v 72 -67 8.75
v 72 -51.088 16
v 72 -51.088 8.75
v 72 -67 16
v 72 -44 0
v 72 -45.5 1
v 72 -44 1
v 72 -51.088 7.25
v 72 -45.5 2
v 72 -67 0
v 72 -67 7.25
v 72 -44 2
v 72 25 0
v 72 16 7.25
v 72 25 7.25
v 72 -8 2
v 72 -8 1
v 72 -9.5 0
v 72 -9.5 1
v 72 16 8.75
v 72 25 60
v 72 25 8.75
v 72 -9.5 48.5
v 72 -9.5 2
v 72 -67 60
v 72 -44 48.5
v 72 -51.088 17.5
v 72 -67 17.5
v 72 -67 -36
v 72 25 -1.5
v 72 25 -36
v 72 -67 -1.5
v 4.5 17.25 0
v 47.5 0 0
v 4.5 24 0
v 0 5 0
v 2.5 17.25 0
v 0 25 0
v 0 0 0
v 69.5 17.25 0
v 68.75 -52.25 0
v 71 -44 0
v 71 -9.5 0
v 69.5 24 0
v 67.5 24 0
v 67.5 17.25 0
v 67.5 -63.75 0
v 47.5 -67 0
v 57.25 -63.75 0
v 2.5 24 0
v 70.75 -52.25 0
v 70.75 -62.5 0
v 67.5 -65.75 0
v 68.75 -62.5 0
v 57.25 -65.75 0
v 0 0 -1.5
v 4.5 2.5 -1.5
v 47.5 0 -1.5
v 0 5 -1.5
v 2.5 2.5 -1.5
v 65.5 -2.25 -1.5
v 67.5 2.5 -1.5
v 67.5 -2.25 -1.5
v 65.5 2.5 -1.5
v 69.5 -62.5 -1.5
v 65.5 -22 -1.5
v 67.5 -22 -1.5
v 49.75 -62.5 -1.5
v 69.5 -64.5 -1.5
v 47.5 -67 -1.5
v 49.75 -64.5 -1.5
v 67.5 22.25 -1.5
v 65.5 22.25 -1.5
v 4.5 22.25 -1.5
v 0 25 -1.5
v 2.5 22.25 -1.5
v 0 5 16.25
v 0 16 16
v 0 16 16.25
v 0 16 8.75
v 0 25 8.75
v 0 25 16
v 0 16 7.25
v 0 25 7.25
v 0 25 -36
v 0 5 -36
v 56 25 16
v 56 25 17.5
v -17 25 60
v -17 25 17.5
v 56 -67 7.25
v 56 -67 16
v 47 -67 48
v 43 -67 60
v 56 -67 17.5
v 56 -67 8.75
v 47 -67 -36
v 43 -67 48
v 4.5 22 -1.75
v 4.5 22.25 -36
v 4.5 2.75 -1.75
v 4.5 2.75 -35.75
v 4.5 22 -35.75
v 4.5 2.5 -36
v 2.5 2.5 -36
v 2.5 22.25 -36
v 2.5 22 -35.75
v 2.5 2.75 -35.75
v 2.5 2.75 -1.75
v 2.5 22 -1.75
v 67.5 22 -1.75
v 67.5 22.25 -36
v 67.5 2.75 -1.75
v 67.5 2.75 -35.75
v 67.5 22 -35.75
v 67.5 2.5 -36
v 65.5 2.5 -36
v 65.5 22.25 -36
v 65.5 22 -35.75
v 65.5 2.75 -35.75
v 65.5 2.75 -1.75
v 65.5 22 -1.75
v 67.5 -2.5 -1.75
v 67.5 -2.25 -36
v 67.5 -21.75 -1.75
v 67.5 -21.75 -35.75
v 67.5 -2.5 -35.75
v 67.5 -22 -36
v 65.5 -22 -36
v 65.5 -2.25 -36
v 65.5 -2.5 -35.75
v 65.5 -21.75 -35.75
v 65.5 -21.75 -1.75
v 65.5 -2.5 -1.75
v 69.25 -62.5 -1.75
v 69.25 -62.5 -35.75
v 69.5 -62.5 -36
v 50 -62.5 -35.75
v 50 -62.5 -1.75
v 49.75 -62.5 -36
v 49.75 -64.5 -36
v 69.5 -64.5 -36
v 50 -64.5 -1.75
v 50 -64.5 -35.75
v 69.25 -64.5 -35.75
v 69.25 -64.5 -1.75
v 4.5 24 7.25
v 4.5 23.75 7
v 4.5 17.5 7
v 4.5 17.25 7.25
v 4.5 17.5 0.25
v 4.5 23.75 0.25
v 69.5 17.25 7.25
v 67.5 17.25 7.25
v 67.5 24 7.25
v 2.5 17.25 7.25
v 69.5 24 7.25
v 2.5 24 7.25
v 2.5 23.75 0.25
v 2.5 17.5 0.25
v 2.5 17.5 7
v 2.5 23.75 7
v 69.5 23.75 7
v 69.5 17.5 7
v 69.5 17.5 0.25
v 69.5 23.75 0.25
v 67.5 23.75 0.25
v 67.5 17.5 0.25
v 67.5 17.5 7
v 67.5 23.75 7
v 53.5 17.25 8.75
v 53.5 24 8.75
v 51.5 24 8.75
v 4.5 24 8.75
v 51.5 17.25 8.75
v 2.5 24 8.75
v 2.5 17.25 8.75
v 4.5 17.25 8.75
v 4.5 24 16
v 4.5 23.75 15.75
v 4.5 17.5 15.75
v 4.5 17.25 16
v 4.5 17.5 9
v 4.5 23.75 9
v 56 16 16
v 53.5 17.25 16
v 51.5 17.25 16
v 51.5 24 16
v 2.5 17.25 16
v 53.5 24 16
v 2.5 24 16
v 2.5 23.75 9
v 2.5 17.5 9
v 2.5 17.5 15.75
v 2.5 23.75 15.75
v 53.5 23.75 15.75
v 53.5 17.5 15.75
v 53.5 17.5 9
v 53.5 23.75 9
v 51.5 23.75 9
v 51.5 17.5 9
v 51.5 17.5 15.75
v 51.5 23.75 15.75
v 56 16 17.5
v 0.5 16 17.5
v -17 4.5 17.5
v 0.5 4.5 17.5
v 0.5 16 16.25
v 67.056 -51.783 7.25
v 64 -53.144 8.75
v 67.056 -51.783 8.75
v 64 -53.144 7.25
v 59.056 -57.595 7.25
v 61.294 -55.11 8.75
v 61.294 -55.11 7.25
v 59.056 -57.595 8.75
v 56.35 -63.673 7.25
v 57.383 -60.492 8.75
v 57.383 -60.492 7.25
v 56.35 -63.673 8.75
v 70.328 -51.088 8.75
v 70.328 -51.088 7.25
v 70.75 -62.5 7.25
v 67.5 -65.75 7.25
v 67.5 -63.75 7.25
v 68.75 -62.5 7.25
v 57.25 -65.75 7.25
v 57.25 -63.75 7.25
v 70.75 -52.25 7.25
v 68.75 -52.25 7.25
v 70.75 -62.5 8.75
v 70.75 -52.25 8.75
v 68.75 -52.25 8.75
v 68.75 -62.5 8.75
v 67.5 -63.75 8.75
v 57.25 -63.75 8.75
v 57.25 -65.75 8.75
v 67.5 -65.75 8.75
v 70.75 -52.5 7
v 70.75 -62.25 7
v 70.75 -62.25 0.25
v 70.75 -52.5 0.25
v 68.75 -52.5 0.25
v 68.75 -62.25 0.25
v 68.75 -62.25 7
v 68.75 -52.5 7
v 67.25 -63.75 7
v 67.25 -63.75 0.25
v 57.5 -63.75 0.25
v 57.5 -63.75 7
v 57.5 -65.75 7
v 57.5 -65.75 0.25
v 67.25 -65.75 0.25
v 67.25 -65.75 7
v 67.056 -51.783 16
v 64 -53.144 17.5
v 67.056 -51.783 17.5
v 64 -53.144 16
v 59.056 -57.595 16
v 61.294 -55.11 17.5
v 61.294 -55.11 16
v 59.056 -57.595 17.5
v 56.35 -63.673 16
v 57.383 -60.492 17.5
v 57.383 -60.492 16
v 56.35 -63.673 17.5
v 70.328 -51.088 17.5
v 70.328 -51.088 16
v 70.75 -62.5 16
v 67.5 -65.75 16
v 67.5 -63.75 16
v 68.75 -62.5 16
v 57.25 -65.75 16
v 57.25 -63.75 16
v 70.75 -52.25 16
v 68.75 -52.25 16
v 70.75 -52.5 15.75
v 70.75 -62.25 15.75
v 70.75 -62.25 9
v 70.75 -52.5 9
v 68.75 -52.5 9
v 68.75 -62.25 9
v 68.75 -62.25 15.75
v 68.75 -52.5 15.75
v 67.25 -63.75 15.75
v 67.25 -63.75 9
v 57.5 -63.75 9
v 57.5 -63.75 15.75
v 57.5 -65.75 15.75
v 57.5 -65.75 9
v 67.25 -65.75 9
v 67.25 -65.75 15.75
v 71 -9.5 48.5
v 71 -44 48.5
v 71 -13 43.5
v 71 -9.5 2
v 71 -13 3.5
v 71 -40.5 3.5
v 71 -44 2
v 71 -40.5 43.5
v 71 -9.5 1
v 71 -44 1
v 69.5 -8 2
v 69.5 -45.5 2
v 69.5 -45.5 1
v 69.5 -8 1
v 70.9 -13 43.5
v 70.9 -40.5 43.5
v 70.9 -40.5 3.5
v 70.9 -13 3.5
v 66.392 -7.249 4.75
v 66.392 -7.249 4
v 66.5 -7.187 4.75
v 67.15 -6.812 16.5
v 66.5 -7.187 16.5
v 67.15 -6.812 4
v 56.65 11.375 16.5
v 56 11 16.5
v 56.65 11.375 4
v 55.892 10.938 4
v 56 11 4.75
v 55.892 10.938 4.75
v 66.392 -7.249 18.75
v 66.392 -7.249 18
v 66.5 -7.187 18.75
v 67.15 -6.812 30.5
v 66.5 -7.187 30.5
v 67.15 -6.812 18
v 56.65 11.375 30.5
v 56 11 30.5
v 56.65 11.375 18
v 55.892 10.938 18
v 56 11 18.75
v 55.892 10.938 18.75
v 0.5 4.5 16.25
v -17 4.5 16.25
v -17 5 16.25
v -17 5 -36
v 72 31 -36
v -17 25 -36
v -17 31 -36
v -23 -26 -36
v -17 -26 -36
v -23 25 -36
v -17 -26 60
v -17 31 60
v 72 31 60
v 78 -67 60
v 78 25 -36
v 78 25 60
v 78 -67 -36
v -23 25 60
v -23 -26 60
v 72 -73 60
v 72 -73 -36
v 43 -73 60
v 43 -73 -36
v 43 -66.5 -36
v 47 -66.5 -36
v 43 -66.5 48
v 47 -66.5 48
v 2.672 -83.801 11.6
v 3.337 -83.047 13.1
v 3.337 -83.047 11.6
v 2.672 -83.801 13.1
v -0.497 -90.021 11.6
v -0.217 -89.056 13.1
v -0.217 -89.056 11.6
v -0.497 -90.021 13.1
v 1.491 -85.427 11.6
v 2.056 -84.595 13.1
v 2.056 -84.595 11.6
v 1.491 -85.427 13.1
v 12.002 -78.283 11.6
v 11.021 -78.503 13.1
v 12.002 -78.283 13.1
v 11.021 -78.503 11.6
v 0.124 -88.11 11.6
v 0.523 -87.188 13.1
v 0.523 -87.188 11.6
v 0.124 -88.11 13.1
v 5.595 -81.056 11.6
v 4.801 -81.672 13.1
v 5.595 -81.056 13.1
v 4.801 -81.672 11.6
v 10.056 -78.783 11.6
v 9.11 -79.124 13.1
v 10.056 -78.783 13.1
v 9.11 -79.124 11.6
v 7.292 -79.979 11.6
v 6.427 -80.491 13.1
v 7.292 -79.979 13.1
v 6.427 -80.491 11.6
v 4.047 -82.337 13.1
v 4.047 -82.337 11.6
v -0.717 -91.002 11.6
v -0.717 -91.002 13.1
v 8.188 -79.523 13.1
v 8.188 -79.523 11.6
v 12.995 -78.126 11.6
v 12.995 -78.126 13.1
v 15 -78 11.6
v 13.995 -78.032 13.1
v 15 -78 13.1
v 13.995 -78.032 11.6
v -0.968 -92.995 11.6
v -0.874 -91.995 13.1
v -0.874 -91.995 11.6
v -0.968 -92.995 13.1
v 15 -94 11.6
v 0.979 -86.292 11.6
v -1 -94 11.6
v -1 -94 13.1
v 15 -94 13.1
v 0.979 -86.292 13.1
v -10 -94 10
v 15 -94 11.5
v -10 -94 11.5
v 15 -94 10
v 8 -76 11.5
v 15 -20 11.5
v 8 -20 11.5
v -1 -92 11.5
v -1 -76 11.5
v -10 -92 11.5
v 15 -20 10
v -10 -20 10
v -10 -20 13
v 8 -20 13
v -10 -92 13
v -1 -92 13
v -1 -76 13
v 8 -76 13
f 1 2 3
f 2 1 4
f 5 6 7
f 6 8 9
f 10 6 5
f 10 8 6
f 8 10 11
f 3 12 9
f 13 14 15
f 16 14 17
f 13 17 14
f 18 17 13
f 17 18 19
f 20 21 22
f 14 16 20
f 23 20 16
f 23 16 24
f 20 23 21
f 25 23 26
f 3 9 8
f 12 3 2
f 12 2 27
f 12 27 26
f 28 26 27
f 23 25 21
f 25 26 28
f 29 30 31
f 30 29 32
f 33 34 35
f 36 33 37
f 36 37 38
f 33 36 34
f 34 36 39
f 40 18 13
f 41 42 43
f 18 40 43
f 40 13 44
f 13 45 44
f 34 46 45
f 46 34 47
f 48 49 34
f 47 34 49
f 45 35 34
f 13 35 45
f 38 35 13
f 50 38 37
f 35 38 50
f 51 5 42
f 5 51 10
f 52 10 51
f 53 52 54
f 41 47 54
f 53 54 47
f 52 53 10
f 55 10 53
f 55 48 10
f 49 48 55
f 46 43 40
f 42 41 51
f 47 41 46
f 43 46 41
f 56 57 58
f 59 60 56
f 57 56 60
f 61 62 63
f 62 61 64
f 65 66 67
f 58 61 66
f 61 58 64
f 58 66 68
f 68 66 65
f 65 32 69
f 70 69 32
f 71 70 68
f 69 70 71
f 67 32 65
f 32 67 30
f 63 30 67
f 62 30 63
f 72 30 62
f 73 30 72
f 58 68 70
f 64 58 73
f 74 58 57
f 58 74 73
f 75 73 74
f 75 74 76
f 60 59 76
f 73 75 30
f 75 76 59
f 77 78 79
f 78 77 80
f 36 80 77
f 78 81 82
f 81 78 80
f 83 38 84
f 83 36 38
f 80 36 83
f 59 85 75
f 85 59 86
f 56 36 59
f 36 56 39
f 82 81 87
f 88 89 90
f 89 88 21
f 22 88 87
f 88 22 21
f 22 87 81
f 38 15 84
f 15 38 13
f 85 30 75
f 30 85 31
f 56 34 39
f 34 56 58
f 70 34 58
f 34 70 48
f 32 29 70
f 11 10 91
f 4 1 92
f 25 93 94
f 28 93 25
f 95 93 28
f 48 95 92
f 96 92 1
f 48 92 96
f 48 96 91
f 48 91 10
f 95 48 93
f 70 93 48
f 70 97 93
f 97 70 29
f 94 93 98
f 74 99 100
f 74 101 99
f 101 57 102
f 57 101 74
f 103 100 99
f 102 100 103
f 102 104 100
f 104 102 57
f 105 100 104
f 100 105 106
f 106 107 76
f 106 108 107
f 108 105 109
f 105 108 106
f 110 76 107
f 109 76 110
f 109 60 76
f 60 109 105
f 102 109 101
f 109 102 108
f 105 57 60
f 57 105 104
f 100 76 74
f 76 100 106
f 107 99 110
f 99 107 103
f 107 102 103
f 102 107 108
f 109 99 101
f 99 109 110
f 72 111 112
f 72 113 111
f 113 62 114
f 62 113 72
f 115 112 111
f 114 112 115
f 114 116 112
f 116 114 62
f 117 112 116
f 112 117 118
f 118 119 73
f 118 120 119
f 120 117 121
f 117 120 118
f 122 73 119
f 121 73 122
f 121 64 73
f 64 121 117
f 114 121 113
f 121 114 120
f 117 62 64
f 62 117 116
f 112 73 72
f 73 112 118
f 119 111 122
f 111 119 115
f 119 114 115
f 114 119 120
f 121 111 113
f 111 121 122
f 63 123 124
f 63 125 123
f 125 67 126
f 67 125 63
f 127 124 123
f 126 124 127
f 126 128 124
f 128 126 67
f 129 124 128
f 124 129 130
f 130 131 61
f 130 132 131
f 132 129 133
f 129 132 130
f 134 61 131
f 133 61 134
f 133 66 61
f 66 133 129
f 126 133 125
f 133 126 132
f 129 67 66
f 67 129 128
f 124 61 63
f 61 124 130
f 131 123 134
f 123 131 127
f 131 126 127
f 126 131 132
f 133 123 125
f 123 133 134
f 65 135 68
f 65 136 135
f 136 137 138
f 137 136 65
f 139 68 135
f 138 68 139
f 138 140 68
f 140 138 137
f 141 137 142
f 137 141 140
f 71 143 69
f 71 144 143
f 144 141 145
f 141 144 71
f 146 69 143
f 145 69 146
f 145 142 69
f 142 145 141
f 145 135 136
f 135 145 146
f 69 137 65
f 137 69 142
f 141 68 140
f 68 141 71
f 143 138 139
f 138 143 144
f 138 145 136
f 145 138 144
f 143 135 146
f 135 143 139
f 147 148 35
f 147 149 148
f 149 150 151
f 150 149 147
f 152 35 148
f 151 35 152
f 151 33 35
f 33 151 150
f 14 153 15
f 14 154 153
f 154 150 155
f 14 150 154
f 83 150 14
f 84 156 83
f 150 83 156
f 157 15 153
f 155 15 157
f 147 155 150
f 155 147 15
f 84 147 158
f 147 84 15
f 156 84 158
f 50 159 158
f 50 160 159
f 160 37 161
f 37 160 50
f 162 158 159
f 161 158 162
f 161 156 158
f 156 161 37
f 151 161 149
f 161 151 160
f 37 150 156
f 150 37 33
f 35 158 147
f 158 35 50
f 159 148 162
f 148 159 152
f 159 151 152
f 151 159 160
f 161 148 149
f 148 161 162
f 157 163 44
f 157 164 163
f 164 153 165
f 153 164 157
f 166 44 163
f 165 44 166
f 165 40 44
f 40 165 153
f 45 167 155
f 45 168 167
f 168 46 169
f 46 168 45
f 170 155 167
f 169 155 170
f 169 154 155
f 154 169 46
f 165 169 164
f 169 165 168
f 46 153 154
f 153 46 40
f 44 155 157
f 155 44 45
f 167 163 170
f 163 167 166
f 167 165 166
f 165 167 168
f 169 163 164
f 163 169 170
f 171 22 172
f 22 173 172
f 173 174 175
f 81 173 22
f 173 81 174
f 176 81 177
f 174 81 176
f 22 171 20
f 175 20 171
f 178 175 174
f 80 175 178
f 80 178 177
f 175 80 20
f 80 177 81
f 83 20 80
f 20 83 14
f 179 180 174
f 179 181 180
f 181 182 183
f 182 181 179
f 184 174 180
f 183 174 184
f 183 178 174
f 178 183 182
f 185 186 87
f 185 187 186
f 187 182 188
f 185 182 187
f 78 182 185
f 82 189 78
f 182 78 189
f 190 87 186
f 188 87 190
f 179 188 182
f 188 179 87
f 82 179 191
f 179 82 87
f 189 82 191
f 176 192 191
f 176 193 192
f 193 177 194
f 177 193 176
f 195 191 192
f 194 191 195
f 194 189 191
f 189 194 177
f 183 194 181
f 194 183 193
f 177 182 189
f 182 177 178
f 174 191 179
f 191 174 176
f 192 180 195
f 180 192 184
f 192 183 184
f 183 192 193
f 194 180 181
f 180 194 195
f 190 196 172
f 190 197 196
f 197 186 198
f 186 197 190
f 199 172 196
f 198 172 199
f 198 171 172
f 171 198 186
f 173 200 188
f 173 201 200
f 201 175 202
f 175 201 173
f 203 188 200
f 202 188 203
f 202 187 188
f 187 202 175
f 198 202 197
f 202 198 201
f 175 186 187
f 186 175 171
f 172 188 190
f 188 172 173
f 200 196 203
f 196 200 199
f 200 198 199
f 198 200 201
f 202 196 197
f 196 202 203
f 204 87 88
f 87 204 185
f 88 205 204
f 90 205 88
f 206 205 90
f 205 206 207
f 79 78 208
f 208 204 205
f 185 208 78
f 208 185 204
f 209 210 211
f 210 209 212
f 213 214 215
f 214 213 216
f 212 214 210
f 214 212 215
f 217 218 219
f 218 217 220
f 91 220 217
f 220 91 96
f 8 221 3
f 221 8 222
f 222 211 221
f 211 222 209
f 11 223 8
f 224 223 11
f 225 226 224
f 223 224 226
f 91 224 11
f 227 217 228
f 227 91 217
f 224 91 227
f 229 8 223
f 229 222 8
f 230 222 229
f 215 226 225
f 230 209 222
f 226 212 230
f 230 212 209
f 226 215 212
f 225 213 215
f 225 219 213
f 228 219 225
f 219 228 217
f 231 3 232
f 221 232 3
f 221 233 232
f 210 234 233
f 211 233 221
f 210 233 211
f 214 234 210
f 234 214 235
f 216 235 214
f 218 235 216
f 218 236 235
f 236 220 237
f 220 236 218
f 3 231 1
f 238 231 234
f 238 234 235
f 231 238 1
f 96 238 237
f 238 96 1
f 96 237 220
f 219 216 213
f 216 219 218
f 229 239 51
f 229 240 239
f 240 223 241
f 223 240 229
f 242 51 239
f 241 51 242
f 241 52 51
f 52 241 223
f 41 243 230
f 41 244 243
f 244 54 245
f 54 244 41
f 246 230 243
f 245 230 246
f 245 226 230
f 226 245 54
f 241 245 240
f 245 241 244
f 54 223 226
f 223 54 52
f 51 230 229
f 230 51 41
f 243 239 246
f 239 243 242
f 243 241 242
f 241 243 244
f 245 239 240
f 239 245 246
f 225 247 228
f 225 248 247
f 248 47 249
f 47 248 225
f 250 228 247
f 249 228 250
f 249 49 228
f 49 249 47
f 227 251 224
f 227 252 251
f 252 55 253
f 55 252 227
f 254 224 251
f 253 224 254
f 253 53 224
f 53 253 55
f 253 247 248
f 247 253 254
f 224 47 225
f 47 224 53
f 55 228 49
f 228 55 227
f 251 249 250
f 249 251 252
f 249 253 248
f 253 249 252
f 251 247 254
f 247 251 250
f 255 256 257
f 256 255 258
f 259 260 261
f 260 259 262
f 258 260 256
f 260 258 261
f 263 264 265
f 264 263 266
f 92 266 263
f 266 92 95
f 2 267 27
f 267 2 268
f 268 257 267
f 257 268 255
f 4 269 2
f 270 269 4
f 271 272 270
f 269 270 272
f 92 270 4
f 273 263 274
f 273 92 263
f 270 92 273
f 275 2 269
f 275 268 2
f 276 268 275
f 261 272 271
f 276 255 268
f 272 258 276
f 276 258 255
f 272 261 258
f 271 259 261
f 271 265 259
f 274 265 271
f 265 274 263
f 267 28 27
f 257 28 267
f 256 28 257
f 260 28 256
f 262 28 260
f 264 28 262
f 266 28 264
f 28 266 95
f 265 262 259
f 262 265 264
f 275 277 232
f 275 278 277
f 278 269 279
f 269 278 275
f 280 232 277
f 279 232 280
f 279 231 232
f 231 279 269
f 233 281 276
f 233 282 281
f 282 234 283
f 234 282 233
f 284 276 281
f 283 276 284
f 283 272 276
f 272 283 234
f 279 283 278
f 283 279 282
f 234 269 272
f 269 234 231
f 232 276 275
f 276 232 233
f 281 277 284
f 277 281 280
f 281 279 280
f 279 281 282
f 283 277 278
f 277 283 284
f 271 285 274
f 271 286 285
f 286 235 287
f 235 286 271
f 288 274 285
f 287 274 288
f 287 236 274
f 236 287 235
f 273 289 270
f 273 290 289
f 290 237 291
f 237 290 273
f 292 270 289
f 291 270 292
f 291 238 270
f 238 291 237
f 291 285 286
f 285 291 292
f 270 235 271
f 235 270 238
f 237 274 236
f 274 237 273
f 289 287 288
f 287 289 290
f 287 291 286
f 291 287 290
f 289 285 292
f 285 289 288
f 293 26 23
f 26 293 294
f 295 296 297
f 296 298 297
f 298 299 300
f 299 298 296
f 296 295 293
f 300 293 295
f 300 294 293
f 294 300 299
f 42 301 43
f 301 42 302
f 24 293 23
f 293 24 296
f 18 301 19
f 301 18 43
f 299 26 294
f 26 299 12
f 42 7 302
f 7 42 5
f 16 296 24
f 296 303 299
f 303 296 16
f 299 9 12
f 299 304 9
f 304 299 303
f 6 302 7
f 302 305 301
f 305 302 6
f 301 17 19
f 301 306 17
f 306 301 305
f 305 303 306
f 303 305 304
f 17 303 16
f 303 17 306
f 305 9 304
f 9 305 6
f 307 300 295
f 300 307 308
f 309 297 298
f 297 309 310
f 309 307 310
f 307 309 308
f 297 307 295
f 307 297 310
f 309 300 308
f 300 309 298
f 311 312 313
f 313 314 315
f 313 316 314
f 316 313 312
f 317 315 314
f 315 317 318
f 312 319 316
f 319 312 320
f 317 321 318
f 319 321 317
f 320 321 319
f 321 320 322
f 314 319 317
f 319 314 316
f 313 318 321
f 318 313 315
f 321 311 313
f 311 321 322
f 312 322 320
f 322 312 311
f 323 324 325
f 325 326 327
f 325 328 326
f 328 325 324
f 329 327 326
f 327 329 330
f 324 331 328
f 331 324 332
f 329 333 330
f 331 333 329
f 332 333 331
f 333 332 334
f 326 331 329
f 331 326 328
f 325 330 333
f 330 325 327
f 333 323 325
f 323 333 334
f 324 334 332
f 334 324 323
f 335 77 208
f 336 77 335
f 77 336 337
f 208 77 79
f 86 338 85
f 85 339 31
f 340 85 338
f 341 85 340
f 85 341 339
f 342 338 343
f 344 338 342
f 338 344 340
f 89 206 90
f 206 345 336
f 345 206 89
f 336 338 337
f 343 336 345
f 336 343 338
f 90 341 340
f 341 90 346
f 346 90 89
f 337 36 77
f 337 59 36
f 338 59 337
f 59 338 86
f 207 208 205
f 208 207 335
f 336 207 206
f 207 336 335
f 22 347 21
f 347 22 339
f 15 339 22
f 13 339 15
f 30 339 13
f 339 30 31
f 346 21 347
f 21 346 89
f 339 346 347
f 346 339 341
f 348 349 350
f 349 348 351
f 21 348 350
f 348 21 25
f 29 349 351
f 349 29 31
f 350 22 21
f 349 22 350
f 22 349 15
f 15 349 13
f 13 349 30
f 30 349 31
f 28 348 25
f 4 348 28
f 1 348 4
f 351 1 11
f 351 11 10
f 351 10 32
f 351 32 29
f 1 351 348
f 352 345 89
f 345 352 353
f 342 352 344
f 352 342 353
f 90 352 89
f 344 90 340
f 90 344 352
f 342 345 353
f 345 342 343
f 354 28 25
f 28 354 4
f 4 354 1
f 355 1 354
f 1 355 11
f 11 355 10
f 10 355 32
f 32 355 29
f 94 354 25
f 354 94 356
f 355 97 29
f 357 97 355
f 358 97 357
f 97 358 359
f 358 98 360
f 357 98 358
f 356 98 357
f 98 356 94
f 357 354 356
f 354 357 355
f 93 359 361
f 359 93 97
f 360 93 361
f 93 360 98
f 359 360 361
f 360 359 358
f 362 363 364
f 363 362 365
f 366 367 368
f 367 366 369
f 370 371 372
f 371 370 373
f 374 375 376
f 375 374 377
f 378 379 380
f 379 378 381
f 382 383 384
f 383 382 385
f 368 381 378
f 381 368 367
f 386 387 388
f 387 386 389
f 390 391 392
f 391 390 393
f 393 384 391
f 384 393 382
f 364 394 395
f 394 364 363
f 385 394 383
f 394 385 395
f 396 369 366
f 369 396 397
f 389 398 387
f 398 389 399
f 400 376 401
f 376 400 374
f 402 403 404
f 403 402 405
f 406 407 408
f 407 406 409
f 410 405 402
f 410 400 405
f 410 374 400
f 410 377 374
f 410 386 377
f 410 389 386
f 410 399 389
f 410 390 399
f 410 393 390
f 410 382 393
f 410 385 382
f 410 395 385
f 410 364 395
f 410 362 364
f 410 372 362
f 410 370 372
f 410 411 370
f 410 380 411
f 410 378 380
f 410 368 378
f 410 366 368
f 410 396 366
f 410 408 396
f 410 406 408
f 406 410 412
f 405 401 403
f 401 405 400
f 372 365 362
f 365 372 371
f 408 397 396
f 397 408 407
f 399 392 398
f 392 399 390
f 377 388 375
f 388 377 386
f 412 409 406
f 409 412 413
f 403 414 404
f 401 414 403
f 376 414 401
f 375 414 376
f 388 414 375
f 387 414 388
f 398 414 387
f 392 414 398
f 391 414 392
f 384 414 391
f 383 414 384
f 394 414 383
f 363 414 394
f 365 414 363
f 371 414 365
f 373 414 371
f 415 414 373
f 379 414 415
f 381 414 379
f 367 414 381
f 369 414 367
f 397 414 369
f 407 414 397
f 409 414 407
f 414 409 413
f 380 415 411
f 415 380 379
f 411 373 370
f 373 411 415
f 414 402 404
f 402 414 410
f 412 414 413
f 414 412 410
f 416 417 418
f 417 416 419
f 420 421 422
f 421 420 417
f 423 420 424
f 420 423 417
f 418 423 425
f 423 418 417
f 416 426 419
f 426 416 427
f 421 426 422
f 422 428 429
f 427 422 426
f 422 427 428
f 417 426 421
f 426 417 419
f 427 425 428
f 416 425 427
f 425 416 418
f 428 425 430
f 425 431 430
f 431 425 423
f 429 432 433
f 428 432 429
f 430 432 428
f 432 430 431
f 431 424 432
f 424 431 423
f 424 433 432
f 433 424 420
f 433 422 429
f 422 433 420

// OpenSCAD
// this whole thing is in inch units

module birch() {
    color("#af692f") children();
}

module leg(height=34.5, width=19.5) {
    color("black") {
        translate([0,0,-height]) cube([2, 1/4, height]);
        translate([0,width,-height]) cube([2, 1/4, height]);
        translate([0,0,-height]) cube([2, width, 1/4]);
        translate([0,0,-1/4]) cube([2, width, 1/4]);
    }
}


module desk() {
    birch() {
        cube([6*12, 25, 1.5]);
        translate([6*12-24.5, -67, 0]) cube([24.5, 67, 1.5]);
    }
    translate([2.5, 2.5, 0]) leg();
    translate([6*12-2.5-4, 2.5, 0]) leg();
    translate([6*12-2.5-4, -19.5-2.5, 0]) leg();
    translate([6*12-2.5, -67+2.5, 0]) rotate([0,0,90]) leg();
}

translate([0,0,-1.5]) desk();


module long_shelf(length=6*12, height=10) {
    echo("Long shelf: ",length/12, "' x", 9, "\"");
    echo("Long shelf: ",length, "\" length");
    birch() translate([0, 25-9, height]) cube([length, 9, 1.5]);
    translate([2.5, 25-9+1.25, height]) leg(height=height, width=9-2.5);
    translate([length-2.5-2, 25-9+1.25, height]) leg(height=height, width=9-2.5);
}
long_shelf(height=7.25);

// 17.5 total height
// 14.5 leg height
// 7.25 each leg
translate([16*0,0,7.25+1.5]) long_shelf(length=6*12-16, height=7.25); // old
//translate([16*0,0,7.25+1.5]) long_shelf(length=46, height=7.25);

module round_shelf(height=10) {
    birch() translate([6*12, -67, height]) intersection() {
        cylinder(h=1.5, r=16);
        translate([-16, 0, 0]) cube([16,16,2]);
    }
    gap= 1.25; // gap between wall and leg
    // width originally determined by 16-2-3*gap but bought 10"
    translate([6*12-2-gap, -67+2+gap+gap, height]) leg(height=height, width=10);
    translate([6*12-2-gap-gap, -67+gap, height]) rotate([0,0,90]) leg(height=height, width=10);
}
round_shelf(7.25);

translate([0,0,7.25+1.5]) round_shelf(7.25);

module window() {
    translate([6*12-1, -37.5-8, -1.5]) {
        color("white") translate([0,1.5]) cube([1, 37.5-1.5*2, 50]);
        color("white") translate([-1.5,0,2.5]) cube([2.5, 37.5, 1]);
        color("blue") translate([-.1,5,5]) cube([1.1, 37.5-5*2, 40]);
    }
}
window();


module monitor() {
    translate([12*6-12,25-10,4]) rotate([0,0,-60]) {
        color("#333333") cube([21, .75, 12.5]);
        color("silver") translate([0,-1/8, 0]) cube([21, 1/8, 3/4]);
    }
}

translate([-4,-4,0]) monitor();
translate([-4,-4,14]) monitor();


module walls() {
    color("#d7faff") translate([-17,25,-34.5-1.5]) cube([6*12+17,6,8*12]);
    color("#d7faff") translate([6*12,-67,-34.5-1.5]) cube([6,67+25,8*12]);
    translate([-17,25-20,-34.5-1.5]) {
       color("#d7faff") cube([17,20,53.5-1.25]);
       color("white") translate([0,-.5,53.5-1.25]) cube([17+.5,20+1,1.25]);
    }
    color("#d7faff", alpha=.5) translate([-17-6,25-20-31,-34.5-1.5]) cube([6,31+20,8*12]);
     color("#d7faff", alpha=.5) translate([6*12-25-4,-67-6,-34.5-1.5]) cube([25+4,6,8*12]);
     color("white", alpha=.5) translate([6*12-25-4,-67,-34.5-1.5]) cube([4,1/2,7*12]);
}
walls();

module shelf_source() {
    birch() cube([74, 25, 1.5]);
    color("blue") translate([0,0,1.5]) cube([72, 9, 1.5]);
    translate([0,9,1.5]) cube([56, 9, 1.5]); // original
//    translate([0,9,1.5]) cube([46, 9, 1.8]); // shorter
    
    color("red") translate([74,9+16,1.6]) rotate([0,0,-270]) intersection() {
        cylinder(h=1.5, r=16, $fn=100);
        translate([-16, 0, 0]) cube([16,16,2]);
    }
    
//    color("orange") translate([74-16-16+4.2,25-16,1.6]) rotate([0,0,-270]) intersection() {
//        cylinder(h=1.5, r=16, $fn=100);
//        translate([0, -16, 0]) cube([16,16,2]);
//    }
    
    
//    translate([74-16/2, 25-16/2, 1.5]) 
//    intersection() {
//        cylinder(h=1.5, d=16);
//        translate([0, -8, -.05]) cube([8, 16, 1.6]);
//    }

}
translate([-10,-20,10]) rotate([0,0,-90]) shelf_source();
